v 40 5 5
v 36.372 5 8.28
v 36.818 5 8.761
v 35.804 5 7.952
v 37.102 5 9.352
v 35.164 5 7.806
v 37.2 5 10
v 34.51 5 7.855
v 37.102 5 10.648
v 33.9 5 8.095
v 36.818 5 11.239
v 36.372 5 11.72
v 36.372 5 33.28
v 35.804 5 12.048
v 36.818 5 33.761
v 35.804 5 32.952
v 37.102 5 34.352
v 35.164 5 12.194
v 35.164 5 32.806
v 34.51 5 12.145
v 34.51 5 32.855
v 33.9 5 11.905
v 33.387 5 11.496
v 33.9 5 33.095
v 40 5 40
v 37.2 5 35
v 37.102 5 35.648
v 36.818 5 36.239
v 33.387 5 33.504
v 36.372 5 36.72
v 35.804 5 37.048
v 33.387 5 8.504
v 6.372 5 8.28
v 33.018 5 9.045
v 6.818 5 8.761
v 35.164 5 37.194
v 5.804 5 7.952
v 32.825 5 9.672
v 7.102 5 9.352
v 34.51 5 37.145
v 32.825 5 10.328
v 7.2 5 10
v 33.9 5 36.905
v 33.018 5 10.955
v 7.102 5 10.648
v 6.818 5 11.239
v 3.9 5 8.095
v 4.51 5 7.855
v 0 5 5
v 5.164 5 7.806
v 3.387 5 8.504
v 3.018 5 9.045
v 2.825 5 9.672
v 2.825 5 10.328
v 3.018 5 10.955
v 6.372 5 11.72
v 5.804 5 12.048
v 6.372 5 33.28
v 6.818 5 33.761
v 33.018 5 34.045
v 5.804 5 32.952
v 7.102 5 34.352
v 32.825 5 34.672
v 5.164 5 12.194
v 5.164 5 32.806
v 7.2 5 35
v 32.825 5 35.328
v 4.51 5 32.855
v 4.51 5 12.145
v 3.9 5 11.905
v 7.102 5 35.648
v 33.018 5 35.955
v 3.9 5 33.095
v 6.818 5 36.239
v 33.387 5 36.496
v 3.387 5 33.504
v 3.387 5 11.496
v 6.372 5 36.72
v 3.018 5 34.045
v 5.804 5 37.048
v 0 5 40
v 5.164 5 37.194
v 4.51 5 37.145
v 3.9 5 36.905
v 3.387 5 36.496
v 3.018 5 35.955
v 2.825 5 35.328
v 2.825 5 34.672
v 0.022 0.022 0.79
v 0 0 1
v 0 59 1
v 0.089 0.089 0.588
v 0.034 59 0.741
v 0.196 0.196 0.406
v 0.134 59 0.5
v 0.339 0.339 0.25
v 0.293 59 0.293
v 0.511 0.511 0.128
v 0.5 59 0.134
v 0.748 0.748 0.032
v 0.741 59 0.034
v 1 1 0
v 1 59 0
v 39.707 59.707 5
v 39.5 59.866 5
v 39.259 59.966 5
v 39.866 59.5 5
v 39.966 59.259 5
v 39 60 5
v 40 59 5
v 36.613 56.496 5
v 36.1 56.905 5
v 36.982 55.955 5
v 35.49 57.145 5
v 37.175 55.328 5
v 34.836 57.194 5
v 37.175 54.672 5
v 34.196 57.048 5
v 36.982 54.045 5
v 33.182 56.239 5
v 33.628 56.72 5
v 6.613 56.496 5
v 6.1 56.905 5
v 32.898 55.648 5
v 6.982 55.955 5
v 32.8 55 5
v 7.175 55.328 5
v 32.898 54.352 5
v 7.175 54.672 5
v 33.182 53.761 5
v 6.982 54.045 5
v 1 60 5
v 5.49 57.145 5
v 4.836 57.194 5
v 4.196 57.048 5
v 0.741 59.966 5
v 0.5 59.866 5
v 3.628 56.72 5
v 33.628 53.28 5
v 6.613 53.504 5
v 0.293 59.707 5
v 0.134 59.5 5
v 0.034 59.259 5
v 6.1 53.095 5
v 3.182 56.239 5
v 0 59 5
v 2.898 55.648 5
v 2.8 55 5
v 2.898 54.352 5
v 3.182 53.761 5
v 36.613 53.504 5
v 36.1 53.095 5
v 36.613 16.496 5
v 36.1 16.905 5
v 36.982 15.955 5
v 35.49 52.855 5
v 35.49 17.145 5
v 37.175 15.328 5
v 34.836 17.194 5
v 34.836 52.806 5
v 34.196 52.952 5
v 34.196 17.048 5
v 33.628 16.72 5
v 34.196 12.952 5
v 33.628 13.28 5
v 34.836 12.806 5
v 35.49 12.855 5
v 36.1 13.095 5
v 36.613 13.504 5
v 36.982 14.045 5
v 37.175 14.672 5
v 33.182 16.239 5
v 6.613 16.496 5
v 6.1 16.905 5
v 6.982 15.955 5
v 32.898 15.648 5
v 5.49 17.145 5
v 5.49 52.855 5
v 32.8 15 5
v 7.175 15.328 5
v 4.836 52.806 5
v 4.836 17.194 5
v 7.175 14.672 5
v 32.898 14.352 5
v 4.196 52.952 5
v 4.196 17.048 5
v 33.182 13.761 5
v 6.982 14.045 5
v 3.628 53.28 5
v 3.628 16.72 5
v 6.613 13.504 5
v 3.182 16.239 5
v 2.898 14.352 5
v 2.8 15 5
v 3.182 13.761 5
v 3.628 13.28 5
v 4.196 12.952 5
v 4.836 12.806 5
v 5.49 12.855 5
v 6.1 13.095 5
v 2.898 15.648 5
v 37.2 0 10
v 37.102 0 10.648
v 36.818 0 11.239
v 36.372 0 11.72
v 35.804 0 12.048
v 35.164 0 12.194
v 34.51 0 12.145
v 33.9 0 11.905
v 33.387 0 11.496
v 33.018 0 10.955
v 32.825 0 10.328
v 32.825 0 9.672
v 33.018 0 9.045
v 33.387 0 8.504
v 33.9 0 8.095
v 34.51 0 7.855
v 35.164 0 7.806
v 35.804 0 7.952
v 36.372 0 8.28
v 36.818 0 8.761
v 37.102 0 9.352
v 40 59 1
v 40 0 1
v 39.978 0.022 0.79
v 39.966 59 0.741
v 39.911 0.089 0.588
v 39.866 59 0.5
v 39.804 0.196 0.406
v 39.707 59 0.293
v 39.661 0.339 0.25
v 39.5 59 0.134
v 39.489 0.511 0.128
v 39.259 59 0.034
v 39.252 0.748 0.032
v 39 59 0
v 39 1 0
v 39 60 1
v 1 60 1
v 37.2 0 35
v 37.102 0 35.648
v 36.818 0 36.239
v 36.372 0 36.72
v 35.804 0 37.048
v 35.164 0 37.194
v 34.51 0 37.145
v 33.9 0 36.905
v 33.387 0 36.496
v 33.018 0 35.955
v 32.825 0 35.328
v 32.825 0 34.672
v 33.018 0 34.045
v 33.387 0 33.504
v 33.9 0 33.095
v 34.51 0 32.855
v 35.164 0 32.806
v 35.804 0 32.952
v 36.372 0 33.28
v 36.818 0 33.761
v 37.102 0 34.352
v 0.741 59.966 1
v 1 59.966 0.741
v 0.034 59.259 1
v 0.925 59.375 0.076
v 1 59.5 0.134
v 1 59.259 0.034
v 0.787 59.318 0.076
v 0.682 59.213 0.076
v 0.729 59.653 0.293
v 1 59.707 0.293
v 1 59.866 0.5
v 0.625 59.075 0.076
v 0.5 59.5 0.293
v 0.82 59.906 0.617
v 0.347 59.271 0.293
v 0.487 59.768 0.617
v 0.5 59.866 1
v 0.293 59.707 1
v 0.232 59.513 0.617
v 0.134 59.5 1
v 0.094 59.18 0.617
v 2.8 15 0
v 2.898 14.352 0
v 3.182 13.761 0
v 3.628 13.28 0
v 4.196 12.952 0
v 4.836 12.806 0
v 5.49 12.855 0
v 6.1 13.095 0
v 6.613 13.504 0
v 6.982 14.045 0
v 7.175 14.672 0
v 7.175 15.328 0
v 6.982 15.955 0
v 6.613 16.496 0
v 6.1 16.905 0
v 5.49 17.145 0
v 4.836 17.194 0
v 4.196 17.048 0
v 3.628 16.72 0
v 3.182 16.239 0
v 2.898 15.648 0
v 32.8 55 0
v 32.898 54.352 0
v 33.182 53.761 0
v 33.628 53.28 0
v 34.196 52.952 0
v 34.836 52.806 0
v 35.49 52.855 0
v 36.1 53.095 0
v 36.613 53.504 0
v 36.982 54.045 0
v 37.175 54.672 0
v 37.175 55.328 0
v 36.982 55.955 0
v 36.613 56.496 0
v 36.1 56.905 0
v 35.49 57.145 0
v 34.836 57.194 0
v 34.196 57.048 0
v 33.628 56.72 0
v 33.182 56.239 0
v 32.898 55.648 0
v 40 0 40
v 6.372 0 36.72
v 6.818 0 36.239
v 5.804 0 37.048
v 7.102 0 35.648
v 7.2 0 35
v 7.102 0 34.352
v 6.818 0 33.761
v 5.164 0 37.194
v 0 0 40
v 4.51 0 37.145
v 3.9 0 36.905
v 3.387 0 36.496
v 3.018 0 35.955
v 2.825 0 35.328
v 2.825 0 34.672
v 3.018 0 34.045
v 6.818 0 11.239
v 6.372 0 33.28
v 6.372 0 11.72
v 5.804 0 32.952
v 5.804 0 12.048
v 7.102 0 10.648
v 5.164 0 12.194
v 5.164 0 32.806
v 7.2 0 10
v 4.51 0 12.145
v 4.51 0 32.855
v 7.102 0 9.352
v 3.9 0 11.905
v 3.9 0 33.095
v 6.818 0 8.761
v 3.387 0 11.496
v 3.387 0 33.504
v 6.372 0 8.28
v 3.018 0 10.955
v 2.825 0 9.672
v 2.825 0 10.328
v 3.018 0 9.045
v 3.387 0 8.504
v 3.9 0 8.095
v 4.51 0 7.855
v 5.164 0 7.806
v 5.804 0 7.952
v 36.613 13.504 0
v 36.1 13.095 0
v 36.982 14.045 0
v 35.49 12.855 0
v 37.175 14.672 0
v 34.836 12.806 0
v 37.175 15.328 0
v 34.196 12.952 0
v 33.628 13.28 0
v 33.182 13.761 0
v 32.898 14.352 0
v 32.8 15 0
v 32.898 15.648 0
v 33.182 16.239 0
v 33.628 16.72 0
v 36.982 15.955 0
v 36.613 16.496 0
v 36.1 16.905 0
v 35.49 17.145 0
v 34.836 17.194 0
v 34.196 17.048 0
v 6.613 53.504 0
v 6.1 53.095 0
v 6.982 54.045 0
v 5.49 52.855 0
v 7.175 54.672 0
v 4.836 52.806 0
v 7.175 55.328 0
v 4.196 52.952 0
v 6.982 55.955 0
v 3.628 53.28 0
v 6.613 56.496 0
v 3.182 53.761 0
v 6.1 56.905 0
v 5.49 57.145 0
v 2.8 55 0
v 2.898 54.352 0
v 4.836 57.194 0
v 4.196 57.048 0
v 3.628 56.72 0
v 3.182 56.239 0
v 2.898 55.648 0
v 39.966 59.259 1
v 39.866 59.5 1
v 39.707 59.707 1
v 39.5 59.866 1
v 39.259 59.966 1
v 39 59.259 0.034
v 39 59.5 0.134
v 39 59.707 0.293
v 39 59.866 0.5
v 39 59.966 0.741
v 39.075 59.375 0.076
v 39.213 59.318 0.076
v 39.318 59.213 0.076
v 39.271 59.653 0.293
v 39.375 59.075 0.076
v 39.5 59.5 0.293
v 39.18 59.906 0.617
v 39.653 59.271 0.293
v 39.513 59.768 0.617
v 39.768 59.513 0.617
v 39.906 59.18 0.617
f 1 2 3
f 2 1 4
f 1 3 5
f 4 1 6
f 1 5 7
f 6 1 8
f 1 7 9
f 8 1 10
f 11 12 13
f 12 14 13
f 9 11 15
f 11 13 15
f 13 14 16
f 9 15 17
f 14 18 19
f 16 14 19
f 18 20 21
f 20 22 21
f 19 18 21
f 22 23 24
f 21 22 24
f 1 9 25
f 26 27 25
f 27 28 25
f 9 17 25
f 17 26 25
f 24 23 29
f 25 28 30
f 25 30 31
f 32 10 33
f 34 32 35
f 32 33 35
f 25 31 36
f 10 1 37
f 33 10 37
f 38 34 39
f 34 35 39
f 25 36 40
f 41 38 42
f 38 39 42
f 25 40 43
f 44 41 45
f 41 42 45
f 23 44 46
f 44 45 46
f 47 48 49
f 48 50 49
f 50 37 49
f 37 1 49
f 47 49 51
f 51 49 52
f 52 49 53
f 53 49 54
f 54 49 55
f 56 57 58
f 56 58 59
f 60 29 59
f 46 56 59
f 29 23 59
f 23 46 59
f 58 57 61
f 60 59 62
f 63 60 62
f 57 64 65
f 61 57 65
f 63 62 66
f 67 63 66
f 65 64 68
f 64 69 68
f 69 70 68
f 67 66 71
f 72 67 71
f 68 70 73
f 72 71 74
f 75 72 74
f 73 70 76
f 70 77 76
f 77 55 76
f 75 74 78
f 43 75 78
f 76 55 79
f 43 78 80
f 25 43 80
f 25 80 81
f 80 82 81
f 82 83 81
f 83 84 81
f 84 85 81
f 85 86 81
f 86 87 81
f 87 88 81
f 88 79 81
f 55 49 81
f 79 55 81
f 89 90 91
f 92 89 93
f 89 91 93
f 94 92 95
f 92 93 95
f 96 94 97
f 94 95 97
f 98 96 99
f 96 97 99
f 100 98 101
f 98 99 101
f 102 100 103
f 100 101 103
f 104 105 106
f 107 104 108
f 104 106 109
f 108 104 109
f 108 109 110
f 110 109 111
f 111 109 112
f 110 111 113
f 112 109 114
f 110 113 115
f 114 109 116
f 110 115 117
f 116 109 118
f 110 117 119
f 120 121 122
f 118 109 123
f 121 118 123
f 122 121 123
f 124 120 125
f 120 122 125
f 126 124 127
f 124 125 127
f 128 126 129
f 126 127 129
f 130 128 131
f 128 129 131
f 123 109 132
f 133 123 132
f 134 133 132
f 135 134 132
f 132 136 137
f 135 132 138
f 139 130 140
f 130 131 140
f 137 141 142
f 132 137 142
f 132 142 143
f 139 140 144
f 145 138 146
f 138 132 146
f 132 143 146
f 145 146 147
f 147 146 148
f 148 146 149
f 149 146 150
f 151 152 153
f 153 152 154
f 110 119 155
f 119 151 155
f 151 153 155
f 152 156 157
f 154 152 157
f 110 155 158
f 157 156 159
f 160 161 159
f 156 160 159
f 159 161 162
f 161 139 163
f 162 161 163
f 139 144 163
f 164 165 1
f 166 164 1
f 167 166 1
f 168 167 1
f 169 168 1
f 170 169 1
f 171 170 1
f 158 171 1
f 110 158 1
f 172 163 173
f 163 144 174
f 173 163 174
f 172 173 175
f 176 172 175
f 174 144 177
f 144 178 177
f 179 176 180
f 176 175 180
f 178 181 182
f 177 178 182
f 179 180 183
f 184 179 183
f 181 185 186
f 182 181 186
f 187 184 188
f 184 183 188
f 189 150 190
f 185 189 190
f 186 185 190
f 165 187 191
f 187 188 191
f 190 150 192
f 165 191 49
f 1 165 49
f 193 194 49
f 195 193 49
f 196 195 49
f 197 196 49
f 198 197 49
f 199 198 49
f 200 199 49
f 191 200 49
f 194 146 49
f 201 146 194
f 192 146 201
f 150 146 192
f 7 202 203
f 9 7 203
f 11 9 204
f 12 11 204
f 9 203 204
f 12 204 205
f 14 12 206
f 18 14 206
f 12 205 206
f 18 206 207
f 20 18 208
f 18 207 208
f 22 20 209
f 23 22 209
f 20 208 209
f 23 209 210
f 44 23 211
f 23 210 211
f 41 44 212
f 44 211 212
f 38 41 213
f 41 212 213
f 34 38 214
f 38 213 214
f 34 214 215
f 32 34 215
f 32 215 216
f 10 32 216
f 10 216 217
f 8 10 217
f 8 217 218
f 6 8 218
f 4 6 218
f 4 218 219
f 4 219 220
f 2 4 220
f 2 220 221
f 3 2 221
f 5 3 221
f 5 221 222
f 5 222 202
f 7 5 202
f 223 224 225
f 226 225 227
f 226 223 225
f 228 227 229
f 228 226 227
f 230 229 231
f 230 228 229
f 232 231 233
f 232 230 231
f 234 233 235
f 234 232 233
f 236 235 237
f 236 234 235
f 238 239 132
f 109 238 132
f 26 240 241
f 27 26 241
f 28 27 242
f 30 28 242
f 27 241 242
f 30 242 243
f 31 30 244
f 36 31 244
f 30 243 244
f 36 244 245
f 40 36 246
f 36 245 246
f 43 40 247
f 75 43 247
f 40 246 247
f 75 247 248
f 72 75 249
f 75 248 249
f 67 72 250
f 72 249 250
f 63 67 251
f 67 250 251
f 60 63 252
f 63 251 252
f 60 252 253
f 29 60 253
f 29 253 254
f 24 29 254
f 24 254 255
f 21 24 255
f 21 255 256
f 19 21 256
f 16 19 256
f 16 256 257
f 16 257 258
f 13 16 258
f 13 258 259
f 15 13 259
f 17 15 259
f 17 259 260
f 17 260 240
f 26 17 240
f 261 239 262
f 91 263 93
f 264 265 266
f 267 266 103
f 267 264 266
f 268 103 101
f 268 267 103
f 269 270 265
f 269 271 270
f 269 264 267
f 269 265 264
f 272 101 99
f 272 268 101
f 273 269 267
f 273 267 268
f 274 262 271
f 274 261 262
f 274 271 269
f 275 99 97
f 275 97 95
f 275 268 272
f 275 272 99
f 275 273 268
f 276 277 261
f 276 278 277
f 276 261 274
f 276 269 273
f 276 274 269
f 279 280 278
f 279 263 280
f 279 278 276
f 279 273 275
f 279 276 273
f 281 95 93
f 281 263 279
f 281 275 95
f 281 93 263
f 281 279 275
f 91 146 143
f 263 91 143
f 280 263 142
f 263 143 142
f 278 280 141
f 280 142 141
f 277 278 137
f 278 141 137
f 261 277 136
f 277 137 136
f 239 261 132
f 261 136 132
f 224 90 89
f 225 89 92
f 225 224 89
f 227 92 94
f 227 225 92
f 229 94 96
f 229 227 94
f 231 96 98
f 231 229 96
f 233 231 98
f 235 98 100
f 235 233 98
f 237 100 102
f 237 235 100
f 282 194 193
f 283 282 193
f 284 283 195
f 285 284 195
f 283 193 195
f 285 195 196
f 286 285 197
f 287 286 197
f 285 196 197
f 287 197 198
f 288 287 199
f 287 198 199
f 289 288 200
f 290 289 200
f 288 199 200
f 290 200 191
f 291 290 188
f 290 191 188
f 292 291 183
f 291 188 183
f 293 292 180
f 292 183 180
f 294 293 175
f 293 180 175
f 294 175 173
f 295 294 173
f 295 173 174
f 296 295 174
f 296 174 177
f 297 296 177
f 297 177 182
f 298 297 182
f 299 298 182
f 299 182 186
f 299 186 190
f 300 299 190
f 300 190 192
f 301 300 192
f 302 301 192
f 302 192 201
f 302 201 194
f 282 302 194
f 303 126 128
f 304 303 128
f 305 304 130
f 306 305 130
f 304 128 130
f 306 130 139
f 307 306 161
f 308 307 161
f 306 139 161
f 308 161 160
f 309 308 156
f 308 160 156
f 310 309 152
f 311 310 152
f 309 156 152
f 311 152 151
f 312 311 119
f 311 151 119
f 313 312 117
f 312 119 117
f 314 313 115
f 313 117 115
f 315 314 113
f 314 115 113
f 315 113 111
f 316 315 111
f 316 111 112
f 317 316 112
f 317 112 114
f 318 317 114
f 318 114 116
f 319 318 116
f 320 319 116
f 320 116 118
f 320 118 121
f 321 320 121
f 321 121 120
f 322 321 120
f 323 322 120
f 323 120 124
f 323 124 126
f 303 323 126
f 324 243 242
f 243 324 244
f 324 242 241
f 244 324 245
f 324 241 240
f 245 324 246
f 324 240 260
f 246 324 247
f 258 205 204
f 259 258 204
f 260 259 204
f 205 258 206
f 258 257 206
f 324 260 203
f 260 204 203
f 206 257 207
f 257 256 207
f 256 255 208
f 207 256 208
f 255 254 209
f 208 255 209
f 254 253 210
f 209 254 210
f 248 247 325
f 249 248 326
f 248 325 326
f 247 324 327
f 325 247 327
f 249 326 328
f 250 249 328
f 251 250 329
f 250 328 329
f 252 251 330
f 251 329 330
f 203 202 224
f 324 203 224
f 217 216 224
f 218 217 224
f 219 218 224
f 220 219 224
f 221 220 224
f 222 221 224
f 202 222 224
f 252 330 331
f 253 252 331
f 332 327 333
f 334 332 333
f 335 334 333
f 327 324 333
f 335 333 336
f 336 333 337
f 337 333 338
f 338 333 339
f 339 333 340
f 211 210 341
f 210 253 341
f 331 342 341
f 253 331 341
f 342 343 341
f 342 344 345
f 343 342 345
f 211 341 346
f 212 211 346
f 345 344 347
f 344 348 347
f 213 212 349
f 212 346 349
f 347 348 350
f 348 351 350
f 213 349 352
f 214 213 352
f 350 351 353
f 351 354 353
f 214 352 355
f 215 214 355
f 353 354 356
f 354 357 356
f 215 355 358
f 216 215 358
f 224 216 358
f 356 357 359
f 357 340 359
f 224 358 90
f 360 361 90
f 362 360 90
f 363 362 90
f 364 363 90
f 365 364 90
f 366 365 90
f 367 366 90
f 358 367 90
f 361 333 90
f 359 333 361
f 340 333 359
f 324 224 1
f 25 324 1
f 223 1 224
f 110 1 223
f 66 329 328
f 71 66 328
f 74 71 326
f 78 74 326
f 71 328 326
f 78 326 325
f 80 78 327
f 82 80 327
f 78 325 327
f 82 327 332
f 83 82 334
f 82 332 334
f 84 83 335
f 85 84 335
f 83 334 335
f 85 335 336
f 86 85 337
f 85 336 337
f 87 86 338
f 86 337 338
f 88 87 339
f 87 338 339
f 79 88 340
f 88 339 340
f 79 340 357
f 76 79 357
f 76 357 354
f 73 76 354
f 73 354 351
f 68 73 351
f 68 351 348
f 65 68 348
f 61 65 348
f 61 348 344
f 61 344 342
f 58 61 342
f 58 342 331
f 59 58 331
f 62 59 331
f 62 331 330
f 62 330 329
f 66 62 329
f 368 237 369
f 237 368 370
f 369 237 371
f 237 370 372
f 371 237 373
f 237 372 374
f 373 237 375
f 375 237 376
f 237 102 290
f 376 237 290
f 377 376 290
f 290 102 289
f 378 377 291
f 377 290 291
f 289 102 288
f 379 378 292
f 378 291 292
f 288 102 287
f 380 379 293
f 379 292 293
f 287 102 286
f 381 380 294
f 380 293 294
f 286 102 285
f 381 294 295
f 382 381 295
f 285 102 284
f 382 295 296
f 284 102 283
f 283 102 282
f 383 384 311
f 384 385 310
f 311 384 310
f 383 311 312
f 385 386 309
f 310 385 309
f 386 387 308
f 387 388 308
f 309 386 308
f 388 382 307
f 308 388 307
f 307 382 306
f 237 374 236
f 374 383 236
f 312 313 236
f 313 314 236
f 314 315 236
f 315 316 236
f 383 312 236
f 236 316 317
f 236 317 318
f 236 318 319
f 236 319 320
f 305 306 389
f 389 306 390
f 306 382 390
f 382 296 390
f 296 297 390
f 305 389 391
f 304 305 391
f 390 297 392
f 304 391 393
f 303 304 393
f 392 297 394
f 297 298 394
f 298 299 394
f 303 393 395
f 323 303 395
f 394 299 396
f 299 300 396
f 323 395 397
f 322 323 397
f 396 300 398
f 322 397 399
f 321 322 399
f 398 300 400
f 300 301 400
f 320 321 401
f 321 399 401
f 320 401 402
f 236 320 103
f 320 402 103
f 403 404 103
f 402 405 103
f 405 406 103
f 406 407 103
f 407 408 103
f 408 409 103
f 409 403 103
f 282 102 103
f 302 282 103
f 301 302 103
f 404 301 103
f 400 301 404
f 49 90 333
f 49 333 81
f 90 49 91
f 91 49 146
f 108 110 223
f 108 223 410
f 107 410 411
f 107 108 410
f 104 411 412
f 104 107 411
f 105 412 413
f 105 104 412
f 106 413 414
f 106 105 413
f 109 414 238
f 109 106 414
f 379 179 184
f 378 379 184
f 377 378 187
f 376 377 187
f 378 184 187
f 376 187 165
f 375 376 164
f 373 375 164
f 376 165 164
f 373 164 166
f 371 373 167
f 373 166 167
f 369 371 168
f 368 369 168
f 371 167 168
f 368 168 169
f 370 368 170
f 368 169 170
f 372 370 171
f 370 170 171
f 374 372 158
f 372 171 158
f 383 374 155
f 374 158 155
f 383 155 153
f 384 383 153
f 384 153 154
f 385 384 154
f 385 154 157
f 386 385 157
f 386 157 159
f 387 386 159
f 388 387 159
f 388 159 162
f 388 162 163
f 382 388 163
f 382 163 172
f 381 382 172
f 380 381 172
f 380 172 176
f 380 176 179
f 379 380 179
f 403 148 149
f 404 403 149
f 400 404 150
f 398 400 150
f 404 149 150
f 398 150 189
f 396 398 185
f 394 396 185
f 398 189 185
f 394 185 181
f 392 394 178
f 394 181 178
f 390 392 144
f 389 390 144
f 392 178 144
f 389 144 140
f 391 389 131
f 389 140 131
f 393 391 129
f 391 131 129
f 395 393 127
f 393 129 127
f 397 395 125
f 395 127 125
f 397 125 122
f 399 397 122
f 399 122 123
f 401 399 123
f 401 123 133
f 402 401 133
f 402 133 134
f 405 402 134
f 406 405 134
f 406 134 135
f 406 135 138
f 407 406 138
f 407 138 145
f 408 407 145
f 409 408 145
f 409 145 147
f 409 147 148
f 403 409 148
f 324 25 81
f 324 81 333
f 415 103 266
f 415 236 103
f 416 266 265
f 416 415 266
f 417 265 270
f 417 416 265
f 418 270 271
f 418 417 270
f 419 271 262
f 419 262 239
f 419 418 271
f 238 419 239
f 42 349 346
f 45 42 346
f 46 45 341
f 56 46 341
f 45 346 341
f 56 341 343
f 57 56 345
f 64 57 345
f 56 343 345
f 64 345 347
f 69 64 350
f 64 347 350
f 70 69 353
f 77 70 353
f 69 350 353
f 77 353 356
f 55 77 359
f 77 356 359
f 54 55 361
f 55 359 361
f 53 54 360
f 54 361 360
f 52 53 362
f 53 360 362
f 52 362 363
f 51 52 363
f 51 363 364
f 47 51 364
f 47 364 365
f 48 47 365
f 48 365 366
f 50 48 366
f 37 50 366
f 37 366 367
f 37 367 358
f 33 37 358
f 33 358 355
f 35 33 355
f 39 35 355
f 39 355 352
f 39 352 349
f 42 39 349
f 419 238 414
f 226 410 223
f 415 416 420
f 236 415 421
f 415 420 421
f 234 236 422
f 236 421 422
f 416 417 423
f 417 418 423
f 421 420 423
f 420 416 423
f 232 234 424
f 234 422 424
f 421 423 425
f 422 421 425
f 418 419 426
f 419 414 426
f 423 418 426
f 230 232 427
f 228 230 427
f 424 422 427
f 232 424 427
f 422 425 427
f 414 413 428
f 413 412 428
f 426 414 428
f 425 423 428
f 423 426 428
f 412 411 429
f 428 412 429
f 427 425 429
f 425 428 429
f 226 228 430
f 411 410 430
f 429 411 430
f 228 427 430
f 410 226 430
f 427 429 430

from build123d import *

# Parameters (mm, degrees)
F1_DEPTH = 40
F3_D     = 4.4
F5_D     = 4.4
F6_R     = 1


with BuildPart() as f1:
    # F0 (on Right) → F1 (new body)
    with BuildSketch(Plane.YZ):
        Polygon((5, 40), (0, 40), (0, 0), (60, 0), (60, 5), (5, 5), align=None)
    extrude(amount=F1_DEPTH)

    # F3 (through all)
    with Locations(Plane(origin=(0, 5, 0), x_dir=(-1, 0, 0), z_dir=(0, 1, 0))):
        with Locations((-35, 35), (-5, 35), (-5, 10), (-35, 10)):
            Hole(F3_D / 2)

    # F5 (through all)
    with Locations(Plane(origin=(0, 0, 0), x_dir=(1, 0, 0), z_dir=(0, 0, -1))):
        with Locations((35, -55), (5, -55), (5, -15), (35, -15)):
            Hole(F5_D / 2)

    # F6
    f6_edges = [f1.edges().sort_by_distance(p)[0] for p in [
        (40, 60, 2.5),
        (0, 60, 2.5),
        (20, 60, 0),
        (0, 30, 0),
        (20, 0, 0),
        (40, 30, 0),
    ]]
    fillet(f6_edges, radius=F6_R)


solid = f1.part
